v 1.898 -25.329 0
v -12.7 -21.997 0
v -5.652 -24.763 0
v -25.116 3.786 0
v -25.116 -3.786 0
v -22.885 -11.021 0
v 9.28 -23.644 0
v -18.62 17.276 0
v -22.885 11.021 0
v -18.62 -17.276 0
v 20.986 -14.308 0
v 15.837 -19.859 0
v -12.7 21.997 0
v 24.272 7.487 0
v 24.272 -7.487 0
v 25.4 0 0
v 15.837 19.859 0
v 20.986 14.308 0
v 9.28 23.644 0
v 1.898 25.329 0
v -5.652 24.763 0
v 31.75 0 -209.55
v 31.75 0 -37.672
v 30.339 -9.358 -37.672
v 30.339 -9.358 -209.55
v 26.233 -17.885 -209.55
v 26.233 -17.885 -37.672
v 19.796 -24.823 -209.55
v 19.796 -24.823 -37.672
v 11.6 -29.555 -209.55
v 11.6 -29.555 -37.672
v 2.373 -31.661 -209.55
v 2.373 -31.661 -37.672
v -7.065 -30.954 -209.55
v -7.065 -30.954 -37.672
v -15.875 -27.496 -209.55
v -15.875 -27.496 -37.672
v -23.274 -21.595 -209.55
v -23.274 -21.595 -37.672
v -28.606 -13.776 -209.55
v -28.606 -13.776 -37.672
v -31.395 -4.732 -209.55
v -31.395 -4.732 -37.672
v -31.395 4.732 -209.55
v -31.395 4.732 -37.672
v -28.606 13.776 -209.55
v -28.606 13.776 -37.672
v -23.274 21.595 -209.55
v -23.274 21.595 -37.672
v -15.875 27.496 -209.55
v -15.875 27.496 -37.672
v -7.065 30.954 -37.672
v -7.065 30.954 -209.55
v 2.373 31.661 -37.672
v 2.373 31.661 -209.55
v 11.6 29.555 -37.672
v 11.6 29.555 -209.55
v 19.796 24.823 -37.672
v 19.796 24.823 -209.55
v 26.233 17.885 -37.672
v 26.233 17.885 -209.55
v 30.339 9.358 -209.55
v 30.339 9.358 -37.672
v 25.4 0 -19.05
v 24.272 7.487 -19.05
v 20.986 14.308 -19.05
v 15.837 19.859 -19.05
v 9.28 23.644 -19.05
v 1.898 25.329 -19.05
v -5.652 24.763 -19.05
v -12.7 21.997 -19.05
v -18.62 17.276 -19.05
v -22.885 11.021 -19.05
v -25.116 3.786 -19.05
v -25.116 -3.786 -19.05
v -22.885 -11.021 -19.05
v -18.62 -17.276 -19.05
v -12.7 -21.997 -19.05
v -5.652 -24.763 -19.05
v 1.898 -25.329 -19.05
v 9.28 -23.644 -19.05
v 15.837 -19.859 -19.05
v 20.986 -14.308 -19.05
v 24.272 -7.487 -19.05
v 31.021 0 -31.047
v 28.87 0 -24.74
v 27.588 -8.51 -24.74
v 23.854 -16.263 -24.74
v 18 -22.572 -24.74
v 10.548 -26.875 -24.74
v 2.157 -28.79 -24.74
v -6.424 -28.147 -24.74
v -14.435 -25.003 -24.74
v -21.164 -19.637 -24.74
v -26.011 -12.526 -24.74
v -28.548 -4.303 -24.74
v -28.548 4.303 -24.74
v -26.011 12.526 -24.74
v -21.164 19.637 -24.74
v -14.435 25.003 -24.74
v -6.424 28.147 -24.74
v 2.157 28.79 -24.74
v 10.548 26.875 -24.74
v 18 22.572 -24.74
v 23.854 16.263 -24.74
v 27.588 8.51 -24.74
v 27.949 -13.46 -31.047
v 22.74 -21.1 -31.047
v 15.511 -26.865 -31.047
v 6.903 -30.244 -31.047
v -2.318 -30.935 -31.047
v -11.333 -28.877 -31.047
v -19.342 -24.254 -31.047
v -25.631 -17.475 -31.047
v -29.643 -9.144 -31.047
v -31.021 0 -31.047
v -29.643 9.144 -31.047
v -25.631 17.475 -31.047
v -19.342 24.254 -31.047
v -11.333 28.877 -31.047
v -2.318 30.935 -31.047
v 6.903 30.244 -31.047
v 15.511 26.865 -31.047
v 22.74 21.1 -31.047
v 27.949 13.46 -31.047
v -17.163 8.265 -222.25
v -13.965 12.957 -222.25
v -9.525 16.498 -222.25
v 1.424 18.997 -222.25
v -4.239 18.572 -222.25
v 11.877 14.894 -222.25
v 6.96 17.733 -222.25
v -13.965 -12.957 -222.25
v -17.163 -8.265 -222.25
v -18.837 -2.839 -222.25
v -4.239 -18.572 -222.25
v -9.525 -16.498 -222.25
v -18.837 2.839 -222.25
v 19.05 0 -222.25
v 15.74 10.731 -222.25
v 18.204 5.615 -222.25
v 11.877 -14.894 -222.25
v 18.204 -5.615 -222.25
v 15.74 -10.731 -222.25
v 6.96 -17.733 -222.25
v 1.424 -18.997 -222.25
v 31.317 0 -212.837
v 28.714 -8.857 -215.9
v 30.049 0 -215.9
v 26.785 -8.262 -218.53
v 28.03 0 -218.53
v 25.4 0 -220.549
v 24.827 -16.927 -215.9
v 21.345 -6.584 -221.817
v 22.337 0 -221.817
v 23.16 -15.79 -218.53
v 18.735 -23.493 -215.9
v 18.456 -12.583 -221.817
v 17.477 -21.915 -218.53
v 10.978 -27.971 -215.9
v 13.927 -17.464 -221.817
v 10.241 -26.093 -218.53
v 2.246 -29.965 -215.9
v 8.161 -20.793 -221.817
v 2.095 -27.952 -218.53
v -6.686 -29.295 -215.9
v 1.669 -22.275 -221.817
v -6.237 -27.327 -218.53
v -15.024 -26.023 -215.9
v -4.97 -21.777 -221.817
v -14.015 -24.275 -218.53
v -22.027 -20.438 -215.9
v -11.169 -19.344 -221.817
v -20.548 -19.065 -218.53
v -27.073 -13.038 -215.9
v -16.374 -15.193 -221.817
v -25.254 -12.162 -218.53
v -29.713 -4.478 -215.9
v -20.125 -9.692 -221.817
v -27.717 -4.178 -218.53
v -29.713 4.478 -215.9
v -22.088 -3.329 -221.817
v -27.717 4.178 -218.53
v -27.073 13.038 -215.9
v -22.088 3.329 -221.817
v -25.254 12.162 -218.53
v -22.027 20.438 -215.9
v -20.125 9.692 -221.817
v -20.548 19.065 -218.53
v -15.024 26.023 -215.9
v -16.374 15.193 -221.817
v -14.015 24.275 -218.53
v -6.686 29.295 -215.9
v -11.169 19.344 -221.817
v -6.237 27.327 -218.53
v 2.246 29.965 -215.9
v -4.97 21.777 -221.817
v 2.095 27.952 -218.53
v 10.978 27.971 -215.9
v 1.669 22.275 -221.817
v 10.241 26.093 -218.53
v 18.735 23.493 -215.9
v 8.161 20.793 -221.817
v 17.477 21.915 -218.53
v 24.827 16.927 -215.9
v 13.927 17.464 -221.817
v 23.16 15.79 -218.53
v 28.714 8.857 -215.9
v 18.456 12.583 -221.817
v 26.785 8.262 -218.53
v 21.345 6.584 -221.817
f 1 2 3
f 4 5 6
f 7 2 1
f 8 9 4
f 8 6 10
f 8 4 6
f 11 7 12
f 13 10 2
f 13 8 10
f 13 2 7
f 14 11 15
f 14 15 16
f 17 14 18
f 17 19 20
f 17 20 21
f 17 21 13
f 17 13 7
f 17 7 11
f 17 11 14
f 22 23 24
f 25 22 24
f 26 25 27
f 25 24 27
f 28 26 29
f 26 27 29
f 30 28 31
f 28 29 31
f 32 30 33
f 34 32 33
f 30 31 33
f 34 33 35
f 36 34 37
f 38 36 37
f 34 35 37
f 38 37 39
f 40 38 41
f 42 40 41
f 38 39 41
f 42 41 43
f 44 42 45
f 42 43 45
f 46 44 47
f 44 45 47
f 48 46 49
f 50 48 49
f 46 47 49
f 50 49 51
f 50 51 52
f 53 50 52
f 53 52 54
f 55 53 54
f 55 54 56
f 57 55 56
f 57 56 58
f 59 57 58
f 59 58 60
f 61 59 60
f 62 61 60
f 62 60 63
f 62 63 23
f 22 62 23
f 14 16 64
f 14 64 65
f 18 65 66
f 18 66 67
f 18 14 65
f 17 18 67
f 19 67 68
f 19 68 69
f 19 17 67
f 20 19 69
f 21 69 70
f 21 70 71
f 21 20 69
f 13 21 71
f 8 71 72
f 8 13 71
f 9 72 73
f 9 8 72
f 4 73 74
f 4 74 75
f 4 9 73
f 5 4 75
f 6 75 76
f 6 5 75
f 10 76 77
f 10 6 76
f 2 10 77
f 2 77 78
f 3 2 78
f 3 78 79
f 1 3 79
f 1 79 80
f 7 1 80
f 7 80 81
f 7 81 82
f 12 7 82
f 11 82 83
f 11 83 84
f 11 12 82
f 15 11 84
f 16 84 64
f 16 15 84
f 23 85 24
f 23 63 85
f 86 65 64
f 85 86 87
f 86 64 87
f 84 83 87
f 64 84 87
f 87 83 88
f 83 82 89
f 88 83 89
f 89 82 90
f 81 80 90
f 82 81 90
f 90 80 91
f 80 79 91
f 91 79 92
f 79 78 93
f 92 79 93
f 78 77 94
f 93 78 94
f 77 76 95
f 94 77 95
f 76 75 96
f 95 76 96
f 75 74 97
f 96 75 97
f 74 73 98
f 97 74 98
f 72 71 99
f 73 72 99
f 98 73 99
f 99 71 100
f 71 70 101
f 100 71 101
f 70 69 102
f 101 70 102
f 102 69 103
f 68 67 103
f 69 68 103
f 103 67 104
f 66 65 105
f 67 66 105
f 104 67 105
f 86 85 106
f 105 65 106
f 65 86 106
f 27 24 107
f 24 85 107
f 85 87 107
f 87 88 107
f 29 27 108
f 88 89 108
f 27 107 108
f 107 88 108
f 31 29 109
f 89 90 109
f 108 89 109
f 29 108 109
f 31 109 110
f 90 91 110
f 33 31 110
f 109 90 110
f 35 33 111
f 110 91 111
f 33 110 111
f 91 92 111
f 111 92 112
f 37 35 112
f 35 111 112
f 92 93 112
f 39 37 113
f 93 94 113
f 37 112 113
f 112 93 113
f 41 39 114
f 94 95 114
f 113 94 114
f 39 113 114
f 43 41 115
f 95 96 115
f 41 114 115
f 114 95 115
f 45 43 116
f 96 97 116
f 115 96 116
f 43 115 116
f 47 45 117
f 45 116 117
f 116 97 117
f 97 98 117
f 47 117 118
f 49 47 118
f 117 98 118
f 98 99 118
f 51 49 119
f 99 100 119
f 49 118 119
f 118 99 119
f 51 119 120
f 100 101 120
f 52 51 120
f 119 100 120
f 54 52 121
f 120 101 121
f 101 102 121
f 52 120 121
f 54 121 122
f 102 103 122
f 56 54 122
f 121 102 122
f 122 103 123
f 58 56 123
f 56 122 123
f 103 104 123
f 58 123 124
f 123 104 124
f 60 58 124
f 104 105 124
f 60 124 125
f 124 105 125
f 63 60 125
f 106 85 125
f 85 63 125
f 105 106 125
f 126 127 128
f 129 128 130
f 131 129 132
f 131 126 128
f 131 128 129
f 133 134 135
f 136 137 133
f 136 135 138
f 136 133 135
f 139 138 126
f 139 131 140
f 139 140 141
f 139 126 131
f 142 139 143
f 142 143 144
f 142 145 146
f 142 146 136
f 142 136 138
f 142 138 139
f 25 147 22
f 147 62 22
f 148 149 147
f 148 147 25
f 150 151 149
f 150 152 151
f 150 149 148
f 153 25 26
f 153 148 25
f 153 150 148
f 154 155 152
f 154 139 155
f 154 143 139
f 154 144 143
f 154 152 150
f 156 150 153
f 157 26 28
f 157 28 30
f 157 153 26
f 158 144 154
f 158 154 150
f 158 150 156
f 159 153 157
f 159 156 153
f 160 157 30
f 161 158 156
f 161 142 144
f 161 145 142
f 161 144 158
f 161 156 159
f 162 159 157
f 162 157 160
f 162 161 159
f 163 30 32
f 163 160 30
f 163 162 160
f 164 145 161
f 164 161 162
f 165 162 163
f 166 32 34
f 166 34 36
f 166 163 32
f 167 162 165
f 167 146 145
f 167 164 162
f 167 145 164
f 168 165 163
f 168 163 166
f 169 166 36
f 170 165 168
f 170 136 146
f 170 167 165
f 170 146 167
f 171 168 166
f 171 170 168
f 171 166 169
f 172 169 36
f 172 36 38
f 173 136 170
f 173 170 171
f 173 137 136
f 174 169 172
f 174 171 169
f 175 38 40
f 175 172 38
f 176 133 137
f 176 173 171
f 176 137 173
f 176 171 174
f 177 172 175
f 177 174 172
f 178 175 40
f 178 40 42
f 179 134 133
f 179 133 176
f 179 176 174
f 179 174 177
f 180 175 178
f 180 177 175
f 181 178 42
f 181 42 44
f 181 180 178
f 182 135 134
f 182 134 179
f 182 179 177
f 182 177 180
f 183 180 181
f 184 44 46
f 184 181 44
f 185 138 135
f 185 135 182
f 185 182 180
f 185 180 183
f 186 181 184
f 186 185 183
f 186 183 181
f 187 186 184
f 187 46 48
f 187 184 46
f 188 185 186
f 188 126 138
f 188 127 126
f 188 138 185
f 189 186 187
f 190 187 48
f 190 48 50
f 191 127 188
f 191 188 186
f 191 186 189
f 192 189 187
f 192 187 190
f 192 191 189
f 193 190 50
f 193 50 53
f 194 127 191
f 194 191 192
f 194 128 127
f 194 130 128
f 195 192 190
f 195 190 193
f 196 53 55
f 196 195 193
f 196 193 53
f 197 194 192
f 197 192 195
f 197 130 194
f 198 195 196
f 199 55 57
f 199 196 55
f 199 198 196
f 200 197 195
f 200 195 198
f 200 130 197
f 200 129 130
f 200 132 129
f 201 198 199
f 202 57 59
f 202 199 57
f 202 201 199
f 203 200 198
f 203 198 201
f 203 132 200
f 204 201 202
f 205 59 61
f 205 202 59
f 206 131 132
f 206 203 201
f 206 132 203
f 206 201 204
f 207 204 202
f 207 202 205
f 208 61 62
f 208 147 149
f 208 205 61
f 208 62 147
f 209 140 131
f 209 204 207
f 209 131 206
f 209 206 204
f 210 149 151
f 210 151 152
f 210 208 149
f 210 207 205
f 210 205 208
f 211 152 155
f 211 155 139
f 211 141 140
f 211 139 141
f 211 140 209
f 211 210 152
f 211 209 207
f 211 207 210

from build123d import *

# Parameters (mm, degrees)
F0_R     = 25.4
F1_DEPTH = 19.05
F2_R     = 31.75
F3_DEPTH = 203.2
F4_R     = 12.7


# Not quite as in the source:
# - a fillet or chamfer that OpenCascade refuses, or shapes differently, is made with other operations: its cross-section is extruded or revolved along the edge and cut away or added


with BuildPart() as f1:
    # F0 (on Top) → F1 (new body)
    with BuildSketch(Plane.XY):
        Circle(F0_R)
    extrude(amount=-F1_DEPTH)

    # F2 (on face) → F3 (join)
    with BuildSketch(Plane(origin=(0, 0, -19.05), x_dir=(1, 0, 0), z_dir=(0, 0, -1))):
        Circle(F2_R)
    extrude(amount=F3_DEPTH)

    # F4
    f4_edges = [f1.edges().sort_by_distance(p)[0] for p in [
        (-31.75, 0, -222.25),
    ]]
    fillet(f4_edges, radius=F4_R)

    # F5: fillet of radius 30.48 on 1 edges, made by hand

    # F5_s1 → F5_t2 (revolve, cut)
    with BuildSketch(Plane.XZ):
        with BuildLine():
            ThreePointArc((31.75, -37.6718554392), (30.1188543967, -27.8344777399), (25.4, -19.05))
            Line((25.4, -19.05), (31.75, -19.05))
            Line((31.75, -19.05), (31.75, -37.6718554392))
        make_face()
    revolve(axis=Axis((0, 0, -19.05), (0, 0, -1)), mode=Mode.SUBTRACT)


solid = f1.part
